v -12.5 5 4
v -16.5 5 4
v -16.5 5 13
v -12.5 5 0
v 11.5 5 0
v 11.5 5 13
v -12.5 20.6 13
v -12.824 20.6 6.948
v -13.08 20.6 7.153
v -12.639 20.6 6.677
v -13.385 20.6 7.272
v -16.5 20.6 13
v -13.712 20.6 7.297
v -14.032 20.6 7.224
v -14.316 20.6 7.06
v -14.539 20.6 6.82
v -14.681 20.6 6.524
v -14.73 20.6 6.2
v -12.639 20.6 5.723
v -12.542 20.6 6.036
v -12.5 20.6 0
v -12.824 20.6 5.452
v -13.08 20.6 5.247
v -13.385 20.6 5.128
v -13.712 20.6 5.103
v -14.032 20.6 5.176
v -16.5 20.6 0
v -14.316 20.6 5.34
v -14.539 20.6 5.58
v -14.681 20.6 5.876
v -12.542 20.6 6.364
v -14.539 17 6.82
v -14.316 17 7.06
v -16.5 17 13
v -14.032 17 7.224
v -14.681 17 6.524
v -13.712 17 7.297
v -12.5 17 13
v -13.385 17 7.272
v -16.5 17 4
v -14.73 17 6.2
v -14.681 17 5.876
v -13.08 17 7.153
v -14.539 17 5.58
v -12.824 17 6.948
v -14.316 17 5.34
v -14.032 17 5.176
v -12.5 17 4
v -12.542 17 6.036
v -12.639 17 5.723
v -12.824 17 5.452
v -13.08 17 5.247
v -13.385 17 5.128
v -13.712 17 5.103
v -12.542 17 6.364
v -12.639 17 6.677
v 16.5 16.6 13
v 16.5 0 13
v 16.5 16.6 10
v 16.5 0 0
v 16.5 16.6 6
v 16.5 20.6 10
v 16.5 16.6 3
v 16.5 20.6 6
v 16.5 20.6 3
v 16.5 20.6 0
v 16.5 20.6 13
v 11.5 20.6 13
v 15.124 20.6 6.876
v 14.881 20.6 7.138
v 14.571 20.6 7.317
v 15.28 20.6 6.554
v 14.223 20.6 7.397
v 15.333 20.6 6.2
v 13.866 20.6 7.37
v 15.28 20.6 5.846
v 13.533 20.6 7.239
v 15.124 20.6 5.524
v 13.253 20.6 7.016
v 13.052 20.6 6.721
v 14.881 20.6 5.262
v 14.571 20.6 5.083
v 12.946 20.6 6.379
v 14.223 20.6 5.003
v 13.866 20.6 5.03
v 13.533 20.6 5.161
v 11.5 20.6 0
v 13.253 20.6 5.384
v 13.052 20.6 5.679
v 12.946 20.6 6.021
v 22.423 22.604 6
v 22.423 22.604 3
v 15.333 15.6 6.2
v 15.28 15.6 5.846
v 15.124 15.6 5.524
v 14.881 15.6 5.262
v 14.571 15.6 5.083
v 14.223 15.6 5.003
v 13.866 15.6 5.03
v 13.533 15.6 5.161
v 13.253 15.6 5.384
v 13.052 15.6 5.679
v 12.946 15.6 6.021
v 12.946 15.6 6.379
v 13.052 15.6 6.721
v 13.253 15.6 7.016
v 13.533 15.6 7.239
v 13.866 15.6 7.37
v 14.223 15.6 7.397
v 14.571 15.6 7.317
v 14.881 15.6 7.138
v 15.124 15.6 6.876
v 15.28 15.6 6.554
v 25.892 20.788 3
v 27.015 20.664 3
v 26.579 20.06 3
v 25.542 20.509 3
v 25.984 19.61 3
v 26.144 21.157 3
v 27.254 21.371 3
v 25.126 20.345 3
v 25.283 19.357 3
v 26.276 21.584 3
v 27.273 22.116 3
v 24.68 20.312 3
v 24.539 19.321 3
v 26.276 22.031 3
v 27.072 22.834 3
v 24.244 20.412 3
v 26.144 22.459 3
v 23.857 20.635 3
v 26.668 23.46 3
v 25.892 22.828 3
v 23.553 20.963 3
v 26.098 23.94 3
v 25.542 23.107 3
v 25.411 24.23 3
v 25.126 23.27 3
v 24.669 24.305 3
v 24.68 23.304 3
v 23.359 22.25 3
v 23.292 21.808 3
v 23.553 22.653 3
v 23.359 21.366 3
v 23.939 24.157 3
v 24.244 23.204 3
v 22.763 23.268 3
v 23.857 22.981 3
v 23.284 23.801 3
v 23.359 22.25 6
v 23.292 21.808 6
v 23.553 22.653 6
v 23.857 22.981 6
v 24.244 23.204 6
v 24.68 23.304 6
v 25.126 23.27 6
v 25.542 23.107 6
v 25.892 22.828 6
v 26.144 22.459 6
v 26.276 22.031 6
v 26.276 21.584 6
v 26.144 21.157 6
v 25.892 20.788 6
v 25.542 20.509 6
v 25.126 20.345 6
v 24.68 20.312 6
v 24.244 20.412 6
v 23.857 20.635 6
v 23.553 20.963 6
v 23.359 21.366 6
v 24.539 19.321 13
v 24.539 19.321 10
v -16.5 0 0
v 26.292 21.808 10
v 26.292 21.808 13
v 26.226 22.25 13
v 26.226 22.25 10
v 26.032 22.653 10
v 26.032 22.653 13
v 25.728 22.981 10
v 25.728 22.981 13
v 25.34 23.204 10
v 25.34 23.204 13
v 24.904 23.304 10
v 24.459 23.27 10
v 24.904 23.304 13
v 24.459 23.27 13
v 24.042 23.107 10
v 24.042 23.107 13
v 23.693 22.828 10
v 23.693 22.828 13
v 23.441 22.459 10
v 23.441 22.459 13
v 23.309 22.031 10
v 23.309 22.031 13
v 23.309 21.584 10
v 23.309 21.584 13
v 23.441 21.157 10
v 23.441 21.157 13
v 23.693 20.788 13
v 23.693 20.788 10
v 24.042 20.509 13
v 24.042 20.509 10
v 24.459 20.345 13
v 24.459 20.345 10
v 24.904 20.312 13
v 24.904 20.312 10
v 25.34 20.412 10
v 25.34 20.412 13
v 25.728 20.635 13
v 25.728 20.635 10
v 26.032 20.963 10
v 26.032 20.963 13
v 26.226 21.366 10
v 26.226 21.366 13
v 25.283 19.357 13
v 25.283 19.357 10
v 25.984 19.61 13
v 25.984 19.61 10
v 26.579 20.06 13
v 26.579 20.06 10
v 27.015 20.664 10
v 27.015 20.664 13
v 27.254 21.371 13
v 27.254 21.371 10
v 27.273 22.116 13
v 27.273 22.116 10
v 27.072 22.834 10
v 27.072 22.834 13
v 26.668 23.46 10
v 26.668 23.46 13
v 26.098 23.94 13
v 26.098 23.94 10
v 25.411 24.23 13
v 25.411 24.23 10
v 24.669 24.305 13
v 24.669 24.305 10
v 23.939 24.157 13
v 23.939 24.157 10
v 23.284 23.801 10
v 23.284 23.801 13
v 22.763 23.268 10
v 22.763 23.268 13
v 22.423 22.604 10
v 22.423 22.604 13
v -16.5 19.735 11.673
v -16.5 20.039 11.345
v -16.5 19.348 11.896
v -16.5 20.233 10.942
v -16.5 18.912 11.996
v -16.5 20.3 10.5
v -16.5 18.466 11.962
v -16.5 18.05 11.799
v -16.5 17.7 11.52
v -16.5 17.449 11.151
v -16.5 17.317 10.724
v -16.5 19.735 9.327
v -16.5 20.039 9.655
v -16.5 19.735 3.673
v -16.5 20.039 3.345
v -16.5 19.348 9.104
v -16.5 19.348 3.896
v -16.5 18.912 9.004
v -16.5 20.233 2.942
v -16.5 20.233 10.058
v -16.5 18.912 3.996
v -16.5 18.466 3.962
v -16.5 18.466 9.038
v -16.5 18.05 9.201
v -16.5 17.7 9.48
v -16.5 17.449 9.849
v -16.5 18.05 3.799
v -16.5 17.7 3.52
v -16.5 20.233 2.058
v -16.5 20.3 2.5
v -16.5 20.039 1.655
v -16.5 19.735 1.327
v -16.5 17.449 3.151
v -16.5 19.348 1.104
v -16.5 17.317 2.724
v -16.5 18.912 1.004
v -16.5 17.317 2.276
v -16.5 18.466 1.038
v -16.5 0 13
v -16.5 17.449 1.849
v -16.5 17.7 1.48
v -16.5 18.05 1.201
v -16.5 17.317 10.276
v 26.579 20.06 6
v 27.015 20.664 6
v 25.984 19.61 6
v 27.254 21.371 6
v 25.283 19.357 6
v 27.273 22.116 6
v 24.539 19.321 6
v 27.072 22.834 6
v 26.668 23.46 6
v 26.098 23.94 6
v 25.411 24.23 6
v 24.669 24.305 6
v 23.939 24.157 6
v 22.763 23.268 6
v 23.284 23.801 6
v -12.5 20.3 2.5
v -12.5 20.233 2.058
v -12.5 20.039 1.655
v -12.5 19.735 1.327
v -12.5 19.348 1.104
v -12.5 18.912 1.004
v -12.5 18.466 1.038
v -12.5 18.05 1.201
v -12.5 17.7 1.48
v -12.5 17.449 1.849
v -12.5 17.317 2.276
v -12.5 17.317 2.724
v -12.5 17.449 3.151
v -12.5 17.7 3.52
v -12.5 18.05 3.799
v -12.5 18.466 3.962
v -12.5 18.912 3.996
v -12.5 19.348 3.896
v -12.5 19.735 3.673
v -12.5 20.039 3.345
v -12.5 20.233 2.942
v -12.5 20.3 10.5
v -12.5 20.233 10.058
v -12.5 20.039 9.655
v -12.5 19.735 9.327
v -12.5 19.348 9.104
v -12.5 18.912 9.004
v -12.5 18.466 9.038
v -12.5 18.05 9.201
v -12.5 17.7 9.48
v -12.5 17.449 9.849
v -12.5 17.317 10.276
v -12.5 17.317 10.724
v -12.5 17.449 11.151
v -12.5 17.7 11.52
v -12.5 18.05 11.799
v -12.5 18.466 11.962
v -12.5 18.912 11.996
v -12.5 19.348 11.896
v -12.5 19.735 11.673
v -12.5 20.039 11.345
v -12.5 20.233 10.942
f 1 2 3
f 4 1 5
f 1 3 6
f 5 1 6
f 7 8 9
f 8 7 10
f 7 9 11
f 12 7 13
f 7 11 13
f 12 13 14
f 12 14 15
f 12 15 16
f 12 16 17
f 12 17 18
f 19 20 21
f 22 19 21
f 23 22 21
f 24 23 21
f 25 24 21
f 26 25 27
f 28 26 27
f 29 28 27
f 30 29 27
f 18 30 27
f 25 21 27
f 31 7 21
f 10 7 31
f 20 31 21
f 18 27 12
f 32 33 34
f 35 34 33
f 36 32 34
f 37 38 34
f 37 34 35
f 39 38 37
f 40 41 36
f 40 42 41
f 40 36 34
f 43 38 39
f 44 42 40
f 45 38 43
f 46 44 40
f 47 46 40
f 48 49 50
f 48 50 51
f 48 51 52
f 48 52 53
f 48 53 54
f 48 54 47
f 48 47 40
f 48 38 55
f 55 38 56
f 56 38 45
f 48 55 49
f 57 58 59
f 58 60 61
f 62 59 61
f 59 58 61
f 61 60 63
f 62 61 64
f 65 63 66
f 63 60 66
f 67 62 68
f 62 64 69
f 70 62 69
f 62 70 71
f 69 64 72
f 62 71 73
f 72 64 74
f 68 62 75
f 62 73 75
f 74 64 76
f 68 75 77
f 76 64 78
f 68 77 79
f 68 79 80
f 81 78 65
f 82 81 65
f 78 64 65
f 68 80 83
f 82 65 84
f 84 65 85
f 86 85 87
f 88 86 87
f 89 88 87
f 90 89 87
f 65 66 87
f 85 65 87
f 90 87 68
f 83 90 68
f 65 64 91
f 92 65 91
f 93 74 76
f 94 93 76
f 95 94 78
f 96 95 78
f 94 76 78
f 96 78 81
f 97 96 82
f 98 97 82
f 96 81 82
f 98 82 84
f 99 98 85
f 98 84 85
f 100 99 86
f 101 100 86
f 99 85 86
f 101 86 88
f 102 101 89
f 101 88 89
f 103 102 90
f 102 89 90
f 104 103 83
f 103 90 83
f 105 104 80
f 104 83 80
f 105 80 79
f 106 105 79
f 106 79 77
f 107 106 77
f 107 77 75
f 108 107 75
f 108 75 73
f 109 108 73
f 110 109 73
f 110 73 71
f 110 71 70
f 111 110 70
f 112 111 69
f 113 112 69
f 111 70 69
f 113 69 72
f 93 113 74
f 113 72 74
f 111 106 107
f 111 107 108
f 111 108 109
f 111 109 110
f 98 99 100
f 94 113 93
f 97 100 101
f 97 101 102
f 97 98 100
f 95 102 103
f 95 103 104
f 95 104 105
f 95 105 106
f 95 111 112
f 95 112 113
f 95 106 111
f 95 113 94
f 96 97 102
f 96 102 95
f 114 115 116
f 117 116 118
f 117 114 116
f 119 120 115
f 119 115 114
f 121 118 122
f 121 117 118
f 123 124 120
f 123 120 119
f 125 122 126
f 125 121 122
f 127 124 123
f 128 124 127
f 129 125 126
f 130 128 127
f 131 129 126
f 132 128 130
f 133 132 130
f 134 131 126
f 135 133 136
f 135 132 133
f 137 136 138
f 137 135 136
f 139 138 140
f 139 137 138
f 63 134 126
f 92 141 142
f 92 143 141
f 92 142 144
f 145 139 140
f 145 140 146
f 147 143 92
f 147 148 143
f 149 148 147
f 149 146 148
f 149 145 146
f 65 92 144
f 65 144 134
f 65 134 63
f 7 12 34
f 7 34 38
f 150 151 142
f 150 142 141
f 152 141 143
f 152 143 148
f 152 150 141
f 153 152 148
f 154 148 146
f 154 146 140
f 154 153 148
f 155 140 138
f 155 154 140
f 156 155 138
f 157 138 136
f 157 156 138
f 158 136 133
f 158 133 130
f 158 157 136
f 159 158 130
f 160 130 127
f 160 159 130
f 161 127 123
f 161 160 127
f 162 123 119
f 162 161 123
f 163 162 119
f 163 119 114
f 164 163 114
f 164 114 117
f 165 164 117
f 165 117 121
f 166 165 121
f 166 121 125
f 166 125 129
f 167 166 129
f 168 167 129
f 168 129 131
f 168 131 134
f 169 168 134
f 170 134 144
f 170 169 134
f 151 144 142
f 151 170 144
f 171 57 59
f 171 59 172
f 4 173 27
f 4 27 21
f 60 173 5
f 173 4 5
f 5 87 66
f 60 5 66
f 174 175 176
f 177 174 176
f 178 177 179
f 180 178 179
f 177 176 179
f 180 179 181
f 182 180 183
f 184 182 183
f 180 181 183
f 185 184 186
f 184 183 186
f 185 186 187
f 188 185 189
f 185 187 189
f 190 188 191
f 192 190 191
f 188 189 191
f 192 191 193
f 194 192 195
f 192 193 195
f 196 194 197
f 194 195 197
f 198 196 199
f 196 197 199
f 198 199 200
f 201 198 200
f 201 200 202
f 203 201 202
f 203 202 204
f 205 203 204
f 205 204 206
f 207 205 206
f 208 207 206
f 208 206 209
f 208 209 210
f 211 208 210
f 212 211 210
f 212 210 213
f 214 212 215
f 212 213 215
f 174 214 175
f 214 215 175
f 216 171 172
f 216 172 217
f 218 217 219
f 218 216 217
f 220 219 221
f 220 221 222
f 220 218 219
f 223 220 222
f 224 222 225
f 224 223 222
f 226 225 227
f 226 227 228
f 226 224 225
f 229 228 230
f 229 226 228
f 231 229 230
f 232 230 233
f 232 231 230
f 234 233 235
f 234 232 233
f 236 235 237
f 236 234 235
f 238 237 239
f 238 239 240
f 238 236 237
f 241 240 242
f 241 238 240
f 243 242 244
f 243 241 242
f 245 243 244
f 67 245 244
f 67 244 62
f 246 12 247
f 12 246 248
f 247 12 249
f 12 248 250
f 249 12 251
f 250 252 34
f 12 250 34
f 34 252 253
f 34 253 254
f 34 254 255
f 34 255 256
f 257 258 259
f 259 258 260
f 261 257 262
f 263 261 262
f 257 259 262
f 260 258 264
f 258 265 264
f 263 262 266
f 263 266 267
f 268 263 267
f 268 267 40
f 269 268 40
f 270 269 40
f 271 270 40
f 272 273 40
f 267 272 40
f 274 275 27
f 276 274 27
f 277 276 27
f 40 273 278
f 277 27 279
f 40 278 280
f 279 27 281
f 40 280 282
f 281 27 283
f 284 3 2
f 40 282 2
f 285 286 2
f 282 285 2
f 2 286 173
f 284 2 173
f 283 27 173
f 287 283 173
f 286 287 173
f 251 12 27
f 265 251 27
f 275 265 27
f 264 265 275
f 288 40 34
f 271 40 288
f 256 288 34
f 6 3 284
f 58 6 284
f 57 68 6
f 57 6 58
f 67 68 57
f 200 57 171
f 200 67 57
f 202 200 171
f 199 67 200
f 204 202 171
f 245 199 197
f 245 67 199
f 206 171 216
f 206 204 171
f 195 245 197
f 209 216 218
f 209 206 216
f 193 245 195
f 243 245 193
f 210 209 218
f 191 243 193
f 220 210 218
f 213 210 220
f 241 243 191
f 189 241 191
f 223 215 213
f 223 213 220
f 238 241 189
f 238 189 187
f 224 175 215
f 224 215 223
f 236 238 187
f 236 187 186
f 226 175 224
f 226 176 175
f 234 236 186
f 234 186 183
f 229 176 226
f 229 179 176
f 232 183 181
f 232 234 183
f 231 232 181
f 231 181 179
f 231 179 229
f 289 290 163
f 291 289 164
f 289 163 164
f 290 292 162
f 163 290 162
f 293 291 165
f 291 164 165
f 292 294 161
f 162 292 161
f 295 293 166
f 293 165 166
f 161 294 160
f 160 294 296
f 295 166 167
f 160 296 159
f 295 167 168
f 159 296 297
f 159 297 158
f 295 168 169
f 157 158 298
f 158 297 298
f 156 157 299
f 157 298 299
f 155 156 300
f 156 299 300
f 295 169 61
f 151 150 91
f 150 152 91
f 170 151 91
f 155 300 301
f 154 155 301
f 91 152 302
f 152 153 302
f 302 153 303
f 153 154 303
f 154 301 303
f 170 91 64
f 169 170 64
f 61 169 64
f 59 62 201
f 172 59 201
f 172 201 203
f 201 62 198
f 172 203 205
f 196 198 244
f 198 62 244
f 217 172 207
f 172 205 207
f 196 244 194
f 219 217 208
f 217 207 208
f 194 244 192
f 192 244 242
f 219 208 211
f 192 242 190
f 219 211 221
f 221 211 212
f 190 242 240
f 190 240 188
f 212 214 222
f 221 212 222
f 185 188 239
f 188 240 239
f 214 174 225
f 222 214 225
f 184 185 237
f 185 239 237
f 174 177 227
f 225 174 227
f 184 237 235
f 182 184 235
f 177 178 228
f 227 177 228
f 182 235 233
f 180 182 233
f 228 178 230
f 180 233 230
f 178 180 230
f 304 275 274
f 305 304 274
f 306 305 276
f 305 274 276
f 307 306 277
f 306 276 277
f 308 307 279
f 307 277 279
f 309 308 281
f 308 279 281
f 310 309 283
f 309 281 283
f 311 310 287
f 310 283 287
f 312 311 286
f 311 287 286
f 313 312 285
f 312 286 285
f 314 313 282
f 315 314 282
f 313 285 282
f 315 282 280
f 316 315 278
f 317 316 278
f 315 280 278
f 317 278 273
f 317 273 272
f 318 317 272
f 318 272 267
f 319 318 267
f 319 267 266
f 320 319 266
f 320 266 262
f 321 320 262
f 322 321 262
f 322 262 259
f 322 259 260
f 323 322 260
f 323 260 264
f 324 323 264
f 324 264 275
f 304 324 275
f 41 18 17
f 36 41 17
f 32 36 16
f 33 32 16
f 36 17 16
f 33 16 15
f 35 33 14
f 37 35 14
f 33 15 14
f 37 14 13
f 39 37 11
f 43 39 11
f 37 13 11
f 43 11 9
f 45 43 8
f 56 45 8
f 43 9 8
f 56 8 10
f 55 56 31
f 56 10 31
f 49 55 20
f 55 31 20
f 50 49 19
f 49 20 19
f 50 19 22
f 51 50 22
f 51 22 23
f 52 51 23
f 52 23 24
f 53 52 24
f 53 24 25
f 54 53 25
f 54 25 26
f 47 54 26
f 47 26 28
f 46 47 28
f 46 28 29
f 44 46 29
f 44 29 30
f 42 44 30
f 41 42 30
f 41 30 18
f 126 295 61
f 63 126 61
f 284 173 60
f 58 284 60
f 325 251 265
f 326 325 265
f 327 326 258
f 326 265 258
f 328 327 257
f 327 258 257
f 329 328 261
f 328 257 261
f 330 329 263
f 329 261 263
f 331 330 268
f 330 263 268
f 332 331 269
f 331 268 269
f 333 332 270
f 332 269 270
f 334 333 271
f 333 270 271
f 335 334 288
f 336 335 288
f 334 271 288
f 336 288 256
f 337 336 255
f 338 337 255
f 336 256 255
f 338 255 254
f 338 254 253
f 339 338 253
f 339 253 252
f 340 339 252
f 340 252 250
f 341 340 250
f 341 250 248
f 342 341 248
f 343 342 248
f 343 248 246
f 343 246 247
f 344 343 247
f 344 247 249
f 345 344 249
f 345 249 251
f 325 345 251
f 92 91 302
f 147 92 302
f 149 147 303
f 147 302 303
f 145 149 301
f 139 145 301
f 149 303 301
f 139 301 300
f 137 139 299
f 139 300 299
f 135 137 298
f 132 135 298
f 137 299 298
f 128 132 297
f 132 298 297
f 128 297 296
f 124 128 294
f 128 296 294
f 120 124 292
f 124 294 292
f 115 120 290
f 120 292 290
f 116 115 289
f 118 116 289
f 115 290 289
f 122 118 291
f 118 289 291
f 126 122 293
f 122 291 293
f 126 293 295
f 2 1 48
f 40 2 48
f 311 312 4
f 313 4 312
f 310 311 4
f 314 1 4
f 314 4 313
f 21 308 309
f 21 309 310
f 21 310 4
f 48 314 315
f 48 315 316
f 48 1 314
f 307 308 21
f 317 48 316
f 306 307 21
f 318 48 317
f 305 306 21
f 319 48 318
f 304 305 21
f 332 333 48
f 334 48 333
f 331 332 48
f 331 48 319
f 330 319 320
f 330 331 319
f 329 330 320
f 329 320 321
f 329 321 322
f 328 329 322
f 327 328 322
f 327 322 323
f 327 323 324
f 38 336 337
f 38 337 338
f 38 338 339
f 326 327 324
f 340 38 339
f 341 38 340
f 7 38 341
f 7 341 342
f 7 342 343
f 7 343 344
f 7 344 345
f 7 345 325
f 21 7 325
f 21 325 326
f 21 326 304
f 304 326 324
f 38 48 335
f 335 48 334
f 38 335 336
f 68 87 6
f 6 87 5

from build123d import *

# Parameters (mm, degrees)
BOSS_EXTRUDE1_DEPTH            = 13
SKETCH2_W                      = 9
SKETCH2_H                      = 12
CUT_EXTRUDE1_DEPTH             = 5
SKETCH3_R                      = 1.1
SKETCH3_R_2                    = 1.2
CUT_EXTRUDE2_DEPTH             = 5
SKETCH4_R                      = 1.5
BOSS_EXTRUDE3_DEPTH            = 3
BOSS_EXTRUDE4_START            = -6
BOSS_EXTRUDE4_OUTLINE_R        = 1.5
BOSS_EXTRUDE4_DEPTH            = 3
CUT_EXTRUDE3_REACH             = 53.746
SKETCH9_R                      = 1.5
CUT_EXTRUDE3_DIRECTION_2_DEPTH = 52.745889594
SKETCH10_W                     = 1
SKETCH10_H                     = 15.6
CUT_EXTRUDE5_DEPTH             = 39.790984582


# Read off the part's stored shape, not the designer's step: Boss-Extrude4
with BuildPart() as part:
    # Sketch1 → Boss-Extrude1 (new body)
    with BuildSketch(Plane.XY):
        Polygon((-11.5, 0), (11.5, 0), (16.5, 0), (16.5, 20.6), (11.5, 20.6), (11.5, 5), (-11.5, 5), (-11.5, 20.6), (-16.5, 20.6), (-16.5, 0), align=None)
    extrude(amount=BOSS_EXTRUDE1_DEPTH)

    # Sketch2 → Cut-Extrude1 (cut)
    with BuildSketch(Plane(origin=(-11.5, 0, 0), x_dir=(0, 0, -1), z_dir=(1, 0, 0))):
        with Locations((-8.5, 11)):
            Rectangle(SKETCH2_W, SKETCH2_H)
    extrude(amount=-CUT_EXTRUDE1_DEPTH, mode=Mode.SUBTRACT)

    # Sketch3 → Cut-Extrude2 (cut)
    with BuildSketch(Plane(origin=(0, 20.6, 0), x_dir=(1, 0, 0), z_dir=(0, 1, 0))):
        with Locations(Location((-13.63, -6.2, 0), (0, 0, 180))):
            Circle(SKETCH3_R)
        with Locations((14.132964109, -6.2)):
            Circle(SKETCH3_R_2)
    extrude(amount=-CUT_EXTRUDE2_DEPTH, mode=Mode.SUBTRACT)

    # Sketch4 → Boss-Extrude3 (add)
    with BuildSketch(Plane.XY.offset(13)):
        with BuildLine():
            Line((22.42265834, 22.604489903), (16.5, 20.6))
            Line((16.5, 20.6), (16.5, 16.600005885))
            Line((16.5, 16.600005885), (24.538834173, 19.320695429))
            ThreePointArc((24.538834173, 19.320695429), (26.893762727, 23.162043036), (22.42265834, 22.604489903))
        make_face()
        with Locations((24.792321364, 21.807811077)):
            Circle(SKETCH4_R, mode=Mode.SUBTRACT)
    extrude(amount=-BOSS_EXTRUDE3_DEPTH)

    # Boss-Extrude4 outline → Boss-Extrude4 (add)
    with BuildSketch(Plane(origin=(0, 0, 0), x_dir=(-1, 0, 0), z_dir=(0, 0, -1)).offset(BOSS_EXTRUDE4_START)):
        with BuildLine():
            Line((-16.499998213, 20.600005281), (-22.42265834, 22.604489903))
            ThreePointArc((-22.42265834, 22.604489903), (-26.893762727, 23.162043036), (-24.538834173, 19.320695429))
            Line((-24.538834173, 19.320695429), (-16.5, 16.600005885))
            Line((-16.5, 16.600005885), (-16.499998213, 20.600005281))
        make_face()
        with Locations((-24.792321364, 21.807811077)):
            Circle(BOSS_EXTRUDE4_OUTLINE_R, mode=Mode.SUBTRACT)
    extrude(amount=BOSS_EXTRUDE4_DEPTH)

    # Sketch9 → Cut-Extrude3 (cut, up to next)
    with BuildSketch(Plane.ZY.offset(16.5), mode=Mode.PRIVATE) as cut_extrude3_sk1:
        with Locations(Location((2.5, 18.8, 0), (0, 0, 90))):
            Circle(SKETCH9_R)
    cut_extrude3_tool1 = extrude(cut_extrude3_sk1.sketch, amount=-CUT_EXTRUDE3_REACH, mode=Mode.PRIVATE) & part.part
    # Sketch9 → Cut-Extrude3 (cut, up to next)
    with BuildSketch(Plane.ZY.offset(16.5), mode=Mode.PRIVATE) as cut_extrude3_sk2:
        with Locations(Location((10.5, 18.8, 0), (0, 0, 90))):
            Circle(SKETCH9_R)
    cut_extrude3_tool2 = extrude(cut_extrude3_sk2.sketch, amount=-CUT_EXTRUDE3_REACH, mode=Mode.PRIVATE) & part.part
    add(cut_extrude3_tool1.solids().sort_by_distance((-16.5, 18.8, 2.5))[0], mode=Mode.SUBTRACT)
    add(cut_extrude3_tool2.solids().sort_by_distance((-16.5, 18.8, 10.5))[0], mode=Mode.SUBTRACT)

    # Sketch9 → Cut-Extrude3 direction 2 (cut)
    with BuildSketch(Plane.ZY.offset(16.5)):
        with Locations(Location((2.5, 18.8, 0), (0, 0, 90))):
            Circle(SKETCH9_R)
        with Locations(Location((10.5, 18.8, 0), (0, 0, 90))):
            Circle(SKETCH9_R)
    extrude(amount=CUT_EXTRUDE3_DIRECTION_2_DEPTH, mode=Mode.SUBTRACT)

    # Sketch10 → Cut-Extrude5 (cut, through all)
    with BuildSketch(Plane.XY.offset(13)):
        with Locations((-12, 12.8)):
            Rectangle(SKETCH10_W, SKETCH10_H)
    extrude(amount=-CUT_EXTRUDE5_DEPTH, mode=Mode.SUBTRACT)


solid = part.part
